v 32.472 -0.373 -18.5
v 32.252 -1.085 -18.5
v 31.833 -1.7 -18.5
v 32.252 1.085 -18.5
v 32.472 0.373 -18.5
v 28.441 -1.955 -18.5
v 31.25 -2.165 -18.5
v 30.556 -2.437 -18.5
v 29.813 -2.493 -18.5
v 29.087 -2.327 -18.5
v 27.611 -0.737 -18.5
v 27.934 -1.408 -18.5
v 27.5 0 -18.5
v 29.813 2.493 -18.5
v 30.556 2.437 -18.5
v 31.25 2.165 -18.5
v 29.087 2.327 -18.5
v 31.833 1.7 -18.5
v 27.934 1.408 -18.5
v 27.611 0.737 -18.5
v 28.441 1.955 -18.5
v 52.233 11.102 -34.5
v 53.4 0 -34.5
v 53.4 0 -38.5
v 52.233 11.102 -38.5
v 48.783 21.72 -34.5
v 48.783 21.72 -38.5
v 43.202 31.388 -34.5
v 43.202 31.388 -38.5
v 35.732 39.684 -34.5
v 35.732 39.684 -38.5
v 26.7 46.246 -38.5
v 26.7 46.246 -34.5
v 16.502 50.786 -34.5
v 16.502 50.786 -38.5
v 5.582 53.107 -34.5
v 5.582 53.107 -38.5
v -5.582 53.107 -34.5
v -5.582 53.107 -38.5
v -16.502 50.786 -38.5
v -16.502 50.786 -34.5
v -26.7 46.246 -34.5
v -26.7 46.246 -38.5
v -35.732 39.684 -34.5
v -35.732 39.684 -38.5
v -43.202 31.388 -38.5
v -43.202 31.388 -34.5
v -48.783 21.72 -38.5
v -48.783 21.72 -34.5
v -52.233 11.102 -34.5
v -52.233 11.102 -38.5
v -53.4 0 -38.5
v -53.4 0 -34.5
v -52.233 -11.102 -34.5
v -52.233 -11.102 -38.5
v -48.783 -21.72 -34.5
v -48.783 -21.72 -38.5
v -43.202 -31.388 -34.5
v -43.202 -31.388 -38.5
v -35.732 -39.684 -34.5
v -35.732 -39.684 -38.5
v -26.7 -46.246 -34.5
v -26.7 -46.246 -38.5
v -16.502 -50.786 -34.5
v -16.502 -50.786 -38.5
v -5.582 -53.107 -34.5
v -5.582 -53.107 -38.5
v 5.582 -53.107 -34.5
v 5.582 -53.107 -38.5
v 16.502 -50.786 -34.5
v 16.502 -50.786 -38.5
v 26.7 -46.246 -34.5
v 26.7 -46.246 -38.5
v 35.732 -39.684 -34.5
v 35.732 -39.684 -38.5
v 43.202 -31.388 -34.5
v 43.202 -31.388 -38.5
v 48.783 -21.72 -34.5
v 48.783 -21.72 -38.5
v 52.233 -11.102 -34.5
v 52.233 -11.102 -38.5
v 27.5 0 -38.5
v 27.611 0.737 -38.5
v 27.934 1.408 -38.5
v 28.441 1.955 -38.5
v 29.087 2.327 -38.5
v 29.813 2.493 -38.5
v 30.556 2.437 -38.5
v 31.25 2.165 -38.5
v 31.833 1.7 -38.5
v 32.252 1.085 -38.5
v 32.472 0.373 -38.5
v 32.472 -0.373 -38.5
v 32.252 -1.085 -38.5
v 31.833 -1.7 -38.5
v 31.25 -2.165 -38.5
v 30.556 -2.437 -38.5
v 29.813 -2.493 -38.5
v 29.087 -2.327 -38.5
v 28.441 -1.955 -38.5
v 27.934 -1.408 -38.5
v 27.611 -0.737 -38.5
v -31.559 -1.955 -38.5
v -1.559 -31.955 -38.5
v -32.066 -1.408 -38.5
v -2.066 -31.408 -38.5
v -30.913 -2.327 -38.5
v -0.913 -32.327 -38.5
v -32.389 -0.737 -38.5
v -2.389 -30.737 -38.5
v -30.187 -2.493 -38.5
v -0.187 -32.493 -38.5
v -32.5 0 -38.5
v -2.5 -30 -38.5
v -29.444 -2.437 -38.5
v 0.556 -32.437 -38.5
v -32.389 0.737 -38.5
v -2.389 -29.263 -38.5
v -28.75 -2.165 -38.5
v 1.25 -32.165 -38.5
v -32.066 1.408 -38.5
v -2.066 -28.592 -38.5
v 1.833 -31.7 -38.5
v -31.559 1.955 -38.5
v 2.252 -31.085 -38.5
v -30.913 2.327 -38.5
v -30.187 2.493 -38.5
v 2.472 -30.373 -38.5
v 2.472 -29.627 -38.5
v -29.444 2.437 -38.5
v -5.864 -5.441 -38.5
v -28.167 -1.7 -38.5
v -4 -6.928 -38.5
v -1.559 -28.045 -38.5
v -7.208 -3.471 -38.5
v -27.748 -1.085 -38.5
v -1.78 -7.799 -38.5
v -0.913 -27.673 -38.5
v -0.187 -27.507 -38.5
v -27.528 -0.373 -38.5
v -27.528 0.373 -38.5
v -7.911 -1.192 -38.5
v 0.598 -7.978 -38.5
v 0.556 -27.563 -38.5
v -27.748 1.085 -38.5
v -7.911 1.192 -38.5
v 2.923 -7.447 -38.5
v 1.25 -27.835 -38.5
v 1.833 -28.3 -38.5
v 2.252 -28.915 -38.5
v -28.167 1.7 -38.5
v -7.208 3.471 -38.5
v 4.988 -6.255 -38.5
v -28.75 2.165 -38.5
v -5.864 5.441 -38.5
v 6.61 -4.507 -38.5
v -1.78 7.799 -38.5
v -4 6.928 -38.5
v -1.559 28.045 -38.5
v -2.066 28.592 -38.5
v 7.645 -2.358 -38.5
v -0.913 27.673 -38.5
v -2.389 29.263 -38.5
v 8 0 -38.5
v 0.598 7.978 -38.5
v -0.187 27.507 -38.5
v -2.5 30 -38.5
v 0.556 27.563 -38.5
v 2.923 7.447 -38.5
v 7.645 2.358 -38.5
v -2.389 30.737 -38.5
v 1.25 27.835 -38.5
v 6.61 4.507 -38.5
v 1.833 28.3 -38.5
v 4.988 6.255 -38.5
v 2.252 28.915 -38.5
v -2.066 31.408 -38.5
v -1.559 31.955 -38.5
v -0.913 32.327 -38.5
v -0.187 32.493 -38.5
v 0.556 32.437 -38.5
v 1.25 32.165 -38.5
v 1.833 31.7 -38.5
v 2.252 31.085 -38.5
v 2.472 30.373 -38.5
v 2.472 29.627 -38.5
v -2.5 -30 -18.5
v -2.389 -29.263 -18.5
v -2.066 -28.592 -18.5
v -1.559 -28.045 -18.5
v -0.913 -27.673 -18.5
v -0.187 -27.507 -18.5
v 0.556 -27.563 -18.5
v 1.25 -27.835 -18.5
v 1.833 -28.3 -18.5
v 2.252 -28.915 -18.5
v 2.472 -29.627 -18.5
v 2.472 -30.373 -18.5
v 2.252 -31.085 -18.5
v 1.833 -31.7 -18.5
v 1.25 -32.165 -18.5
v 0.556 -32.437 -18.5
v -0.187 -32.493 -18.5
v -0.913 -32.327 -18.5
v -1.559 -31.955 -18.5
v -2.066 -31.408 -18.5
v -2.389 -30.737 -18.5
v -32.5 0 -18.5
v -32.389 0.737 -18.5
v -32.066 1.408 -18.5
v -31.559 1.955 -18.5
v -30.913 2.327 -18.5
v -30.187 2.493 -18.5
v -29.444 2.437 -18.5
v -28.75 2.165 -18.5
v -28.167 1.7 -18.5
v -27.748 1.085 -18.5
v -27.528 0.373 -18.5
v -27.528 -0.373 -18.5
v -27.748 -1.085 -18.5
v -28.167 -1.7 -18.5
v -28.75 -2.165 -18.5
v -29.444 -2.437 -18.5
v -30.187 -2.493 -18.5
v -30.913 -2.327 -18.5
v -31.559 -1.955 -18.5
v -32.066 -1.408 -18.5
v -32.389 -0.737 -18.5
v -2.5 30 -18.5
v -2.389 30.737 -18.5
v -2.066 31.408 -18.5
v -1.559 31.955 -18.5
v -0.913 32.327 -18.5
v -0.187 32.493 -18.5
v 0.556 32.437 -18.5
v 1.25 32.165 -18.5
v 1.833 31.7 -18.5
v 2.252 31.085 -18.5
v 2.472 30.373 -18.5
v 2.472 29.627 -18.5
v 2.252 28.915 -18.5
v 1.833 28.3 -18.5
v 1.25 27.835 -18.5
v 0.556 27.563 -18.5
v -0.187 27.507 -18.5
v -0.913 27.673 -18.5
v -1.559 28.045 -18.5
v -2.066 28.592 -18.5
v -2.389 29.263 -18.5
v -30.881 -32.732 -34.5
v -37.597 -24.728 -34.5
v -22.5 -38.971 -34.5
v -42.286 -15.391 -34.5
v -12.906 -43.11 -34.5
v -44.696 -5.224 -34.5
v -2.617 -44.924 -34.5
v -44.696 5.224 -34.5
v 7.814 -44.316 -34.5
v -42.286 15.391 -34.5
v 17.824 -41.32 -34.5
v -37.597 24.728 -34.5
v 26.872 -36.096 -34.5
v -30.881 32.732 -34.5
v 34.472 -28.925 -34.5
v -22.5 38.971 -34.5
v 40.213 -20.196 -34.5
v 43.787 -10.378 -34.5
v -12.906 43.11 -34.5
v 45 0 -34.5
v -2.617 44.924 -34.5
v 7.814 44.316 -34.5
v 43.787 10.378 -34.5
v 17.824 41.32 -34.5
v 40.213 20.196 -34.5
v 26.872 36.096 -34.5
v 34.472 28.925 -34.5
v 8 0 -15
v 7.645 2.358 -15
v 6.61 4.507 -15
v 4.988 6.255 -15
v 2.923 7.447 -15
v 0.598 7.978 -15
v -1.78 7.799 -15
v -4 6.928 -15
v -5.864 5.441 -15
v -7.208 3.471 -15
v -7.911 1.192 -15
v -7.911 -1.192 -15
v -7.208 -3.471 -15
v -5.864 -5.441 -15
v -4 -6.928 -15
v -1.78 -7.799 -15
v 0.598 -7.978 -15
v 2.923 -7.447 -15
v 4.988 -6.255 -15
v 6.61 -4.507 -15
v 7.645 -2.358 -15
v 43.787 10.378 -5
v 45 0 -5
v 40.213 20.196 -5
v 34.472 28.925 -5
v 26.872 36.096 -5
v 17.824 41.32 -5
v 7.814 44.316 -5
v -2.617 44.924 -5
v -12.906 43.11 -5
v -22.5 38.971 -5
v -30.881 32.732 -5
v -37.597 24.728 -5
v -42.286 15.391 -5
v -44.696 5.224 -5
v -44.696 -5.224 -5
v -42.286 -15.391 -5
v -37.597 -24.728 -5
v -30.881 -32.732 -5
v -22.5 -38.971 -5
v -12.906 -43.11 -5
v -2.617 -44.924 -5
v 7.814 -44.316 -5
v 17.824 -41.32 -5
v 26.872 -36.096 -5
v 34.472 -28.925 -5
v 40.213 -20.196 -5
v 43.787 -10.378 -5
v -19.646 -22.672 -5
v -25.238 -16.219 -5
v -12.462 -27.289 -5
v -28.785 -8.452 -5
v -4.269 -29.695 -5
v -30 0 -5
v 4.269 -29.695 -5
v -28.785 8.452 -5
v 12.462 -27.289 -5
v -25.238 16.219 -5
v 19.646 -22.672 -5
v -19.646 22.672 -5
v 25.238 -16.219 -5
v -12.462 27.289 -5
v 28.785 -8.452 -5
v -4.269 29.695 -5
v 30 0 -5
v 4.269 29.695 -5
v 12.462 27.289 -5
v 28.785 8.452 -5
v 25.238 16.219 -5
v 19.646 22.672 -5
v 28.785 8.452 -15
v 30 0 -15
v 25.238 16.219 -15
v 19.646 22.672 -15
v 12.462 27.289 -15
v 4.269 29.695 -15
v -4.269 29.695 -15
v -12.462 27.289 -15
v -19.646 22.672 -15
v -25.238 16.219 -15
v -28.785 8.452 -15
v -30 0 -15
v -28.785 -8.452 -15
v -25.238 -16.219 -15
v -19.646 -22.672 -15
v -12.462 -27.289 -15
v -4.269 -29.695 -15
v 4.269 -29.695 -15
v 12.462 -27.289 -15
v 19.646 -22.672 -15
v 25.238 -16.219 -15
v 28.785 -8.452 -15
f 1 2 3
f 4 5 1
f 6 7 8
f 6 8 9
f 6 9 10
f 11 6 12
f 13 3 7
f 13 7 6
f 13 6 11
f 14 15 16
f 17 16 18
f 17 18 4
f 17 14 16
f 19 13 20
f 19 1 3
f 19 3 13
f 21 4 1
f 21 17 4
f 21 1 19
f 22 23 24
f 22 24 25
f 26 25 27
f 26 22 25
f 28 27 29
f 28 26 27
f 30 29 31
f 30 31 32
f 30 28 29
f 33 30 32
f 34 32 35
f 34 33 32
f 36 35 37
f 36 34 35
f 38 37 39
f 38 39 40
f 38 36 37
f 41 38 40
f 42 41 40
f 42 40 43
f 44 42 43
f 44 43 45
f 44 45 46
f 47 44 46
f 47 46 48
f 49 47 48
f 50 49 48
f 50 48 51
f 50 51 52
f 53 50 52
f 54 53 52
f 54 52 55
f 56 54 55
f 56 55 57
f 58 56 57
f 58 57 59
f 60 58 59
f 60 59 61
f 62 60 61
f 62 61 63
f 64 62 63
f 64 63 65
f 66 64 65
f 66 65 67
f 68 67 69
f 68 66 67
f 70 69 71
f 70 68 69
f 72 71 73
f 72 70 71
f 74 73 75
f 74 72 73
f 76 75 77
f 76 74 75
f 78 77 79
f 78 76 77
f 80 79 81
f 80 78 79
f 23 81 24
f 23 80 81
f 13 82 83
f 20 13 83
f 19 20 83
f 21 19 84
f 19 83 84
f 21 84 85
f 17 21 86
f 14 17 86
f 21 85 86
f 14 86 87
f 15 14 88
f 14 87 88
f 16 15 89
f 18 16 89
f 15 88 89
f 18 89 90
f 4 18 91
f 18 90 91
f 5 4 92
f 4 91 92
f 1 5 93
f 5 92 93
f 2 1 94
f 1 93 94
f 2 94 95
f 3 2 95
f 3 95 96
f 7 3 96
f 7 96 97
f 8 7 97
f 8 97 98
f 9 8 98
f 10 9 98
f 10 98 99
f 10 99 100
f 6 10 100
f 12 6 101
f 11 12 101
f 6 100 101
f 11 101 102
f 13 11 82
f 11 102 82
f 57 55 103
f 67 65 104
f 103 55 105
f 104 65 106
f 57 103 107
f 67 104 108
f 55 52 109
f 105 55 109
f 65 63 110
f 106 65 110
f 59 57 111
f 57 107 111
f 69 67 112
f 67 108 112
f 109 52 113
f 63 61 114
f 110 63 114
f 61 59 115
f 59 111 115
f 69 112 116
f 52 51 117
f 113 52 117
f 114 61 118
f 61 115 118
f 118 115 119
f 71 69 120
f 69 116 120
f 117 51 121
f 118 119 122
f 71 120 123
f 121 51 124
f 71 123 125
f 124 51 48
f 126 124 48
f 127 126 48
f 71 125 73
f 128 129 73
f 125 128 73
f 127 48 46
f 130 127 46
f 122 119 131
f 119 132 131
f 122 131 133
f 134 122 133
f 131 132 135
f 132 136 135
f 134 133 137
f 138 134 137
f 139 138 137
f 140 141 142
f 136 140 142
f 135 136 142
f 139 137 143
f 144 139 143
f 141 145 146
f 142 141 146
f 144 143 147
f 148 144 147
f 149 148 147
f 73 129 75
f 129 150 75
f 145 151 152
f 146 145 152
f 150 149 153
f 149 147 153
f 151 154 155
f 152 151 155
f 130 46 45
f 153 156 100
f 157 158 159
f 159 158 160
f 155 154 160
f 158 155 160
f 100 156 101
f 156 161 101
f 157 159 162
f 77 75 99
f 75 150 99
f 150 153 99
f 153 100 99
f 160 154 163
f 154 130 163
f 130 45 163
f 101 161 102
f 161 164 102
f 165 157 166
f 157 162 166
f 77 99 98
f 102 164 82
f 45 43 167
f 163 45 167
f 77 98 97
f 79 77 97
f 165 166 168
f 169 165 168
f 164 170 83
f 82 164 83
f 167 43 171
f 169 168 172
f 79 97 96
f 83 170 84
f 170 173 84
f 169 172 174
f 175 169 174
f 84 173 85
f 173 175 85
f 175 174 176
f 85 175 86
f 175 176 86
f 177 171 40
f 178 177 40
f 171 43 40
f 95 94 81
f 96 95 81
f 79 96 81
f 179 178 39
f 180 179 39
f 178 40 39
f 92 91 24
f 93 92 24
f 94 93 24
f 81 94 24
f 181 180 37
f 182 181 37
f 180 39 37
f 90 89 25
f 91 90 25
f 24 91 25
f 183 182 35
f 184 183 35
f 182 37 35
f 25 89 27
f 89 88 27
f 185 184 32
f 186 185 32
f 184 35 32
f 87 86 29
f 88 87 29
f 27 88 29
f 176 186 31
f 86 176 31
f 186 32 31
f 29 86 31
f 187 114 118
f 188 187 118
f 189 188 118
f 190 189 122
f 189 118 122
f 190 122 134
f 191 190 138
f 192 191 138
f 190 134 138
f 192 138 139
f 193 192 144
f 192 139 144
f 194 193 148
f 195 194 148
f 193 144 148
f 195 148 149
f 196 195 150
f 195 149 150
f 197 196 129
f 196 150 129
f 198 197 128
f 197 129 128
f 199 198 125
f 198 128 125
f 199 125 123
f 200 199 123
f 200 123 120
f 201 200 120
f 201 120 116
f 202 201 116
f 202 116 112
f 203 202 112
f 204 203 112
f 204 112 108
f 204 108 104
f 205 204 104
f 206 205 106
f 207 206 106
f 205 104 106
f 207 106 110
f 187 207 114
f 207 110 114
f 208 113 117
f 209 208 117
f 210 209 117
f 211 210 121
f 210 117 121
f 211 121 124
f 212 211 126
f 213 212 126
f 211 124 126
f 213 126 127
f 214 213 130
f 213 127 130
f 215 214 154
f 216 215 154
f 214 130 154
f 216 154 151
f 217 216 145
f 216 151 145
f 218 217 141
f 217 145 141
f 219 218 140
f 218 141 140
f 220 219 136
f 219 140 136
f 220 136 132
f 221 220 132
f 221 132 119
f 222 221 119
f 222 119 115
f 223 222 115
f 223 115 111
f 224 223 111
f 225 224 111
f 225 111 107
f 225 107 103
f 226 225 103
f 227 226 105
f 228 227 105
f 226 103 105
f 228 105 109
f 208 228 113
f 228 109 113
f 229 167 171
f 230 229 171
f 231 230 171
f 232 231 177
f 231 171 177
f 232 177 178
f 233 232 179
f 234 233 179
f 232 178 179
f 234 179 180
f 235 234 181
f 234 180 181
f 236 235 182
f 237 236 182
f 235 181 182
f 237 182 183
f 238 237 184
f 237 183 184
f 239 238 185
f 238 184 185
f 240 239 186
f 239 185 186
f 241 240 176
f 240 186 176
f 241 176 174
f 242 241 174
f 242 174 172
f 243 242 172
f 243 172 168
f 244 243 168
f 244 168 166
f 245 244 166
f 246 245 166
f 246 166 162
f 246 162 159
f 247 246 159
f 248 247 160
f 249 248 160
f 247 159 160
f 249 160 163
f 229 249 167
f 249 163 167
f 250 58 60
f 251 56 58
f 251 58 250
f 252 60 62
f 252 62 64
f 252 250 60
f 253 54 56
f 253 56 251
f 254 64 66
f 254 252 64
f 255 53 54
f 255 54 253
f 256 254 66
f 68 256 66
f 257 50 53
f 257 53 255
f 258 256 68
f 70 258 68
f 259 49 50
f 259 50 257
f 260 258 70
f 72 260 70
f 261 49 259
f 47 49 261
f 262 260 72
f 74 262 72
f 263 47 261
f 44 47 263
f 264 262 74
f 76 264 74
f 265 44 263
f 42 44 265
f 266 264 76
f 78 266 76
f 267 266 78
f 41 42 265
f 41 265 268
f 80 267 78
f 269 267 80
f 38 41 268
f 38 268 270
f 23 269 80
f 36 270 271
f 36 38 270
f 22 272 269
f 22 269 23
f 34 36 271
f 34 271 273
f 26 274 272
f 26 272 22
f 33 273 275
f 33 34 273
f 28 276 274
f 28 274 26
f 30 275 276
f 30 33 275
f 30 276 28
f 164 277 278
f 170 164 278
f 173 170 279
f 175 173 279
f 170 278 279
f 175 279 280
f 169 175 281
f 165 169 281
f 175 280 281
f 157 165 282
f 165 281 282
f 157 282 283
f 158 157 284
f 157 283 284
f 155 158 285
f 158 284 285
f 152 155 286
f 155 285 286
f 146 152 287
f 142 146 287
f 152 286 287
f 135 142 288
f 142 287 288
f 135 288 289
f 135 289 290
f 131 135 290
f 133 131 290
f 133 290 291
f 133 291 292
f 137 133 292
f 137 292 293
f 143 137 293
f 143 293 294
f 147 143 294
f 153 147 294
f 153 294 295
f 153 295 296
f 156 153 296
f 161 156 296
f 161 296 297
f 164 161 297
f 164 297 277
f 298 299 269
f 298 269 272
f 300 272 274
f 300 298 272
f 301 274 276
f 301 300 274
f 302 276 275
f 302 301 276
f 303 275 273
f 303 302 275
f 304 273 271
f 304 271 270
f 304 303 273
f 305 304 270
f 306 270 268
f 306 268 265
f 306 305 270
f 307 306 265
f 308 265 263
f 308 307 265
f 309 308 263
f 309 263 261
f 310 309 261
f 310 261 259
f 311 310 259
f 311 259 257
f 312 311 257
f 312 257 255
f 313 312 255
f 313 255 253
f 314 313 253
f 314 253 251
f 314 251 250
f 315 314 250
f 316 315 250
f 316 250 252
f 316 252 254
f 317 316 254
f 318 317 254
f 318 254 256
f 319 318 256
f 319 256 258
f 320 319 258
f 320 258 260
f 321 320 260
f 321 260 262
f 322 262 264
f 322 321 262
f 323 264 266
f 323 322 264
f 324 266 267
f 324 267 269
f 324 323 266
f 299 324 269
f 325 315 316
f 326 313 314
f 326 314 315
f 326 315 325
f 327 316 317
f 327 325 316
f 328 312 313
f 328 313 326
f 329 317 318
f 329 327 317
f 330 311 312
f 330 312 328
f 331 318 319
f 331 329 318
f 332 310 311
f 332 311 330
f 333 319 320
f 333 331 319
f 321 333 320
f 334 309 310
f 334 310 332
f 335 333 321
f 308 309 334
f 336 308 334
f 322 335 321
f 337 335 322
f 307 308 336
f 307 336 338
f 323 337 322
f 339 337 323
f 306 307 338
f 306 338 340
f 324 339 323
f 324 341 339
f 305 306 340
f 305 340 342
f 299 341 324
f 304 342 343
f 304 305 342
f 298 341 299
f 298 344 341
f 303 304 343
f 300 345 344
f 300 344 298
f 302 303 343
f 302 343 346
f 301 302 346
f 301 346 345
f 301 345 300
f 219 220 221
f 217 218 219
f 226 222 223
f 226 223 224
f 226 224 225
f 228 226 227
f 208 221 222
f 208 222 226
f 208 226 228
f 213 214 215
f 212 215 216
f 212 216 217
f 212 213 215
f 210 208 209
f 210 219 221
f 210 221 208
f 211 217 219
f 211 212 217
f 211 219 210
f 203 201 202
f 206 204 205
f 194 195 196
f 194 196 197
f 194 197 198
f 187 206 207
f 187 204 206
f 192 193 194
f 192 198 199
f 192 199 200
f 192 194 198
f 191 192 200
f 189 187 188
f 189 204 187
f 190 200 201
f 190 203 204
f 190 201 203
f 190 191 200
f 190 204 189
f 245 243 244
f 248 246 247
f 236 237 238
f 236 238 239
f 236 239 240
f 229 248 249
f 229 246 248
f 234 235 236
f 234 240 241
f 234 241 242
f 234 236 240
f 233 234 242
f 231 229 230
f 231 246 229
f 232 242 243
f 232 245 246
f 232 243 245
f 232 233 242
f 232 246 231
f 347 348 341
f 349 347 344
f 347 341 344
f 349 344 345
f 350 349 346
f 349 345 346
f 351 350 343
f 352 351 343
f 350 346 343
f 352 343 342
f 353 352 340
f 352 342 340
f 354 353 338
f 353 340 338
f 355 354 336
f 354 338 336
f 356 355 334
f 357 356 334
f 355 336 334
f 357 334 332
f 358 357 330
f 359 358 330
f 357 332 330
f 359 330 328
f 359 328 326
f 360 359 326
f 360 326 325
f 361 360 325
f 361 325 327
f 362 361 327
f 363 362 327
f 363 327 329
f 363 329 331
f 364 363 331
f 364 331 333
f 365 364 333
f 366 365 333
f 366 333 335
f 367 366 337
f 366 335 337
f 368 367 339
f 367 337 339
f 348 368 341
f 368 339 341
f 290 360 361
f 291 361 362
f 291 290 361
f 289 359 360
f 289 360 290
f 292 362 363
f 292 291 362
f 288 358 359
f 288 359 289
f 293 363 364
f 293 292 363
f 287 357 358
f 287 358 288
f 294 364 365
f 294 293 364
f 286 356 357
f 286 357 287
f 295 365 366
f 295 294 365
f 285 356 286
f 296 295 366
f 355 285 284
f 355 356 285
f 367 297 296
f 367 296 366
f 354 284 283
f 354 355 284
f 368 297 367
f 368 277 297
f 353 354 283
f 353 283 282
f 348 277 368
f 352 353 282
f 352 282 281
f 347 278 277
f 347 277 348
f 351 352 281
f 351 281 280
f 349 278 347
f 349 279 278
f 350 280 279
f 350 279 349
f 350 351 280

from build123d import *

# Parameters (mm, degrees)
SKETCH3_R               = 53.4
BOSS_EXTRUDE1_DEPTH     = 38.5
SKETCH4_R               = 8
CUT_EXTRUDE1_DEPTH      = 85.766561804
BOSS_EXTRUDE3_START     = 2
SKETCH6_R               = 16
SKETCH6_R_2             = 8
BOSS_EXTRUDE3_DEPTH     = 2
SKETCH8_R               = 2.5
CUT_EXTRUDE4_DEPTH      = 20
SKETCH9_R               = 53.4
SKETCH9_R_2             = 45
CUT_EXTRUDE5_DEPTH      = 34.5
CUT_EXTRUDE6_DEPTH      = 2
CUT_EXTRUDE6_DEPTH_BACK = 5
SKETCH10_R              = 50
SKETCH11_R              = 30
CUT_EXTRUDE7_DEPTH      = 10


with BuildPart() as part:
    # Sketch3 → Boss-Extrude1 (new body)
    with BuildSketch(Plane.XY):
        Circle(SKETCH3_R)
    extrude(amount=-BOSS_EXTRUDE1_DEPTH)

    # Sketch4 → Cut-Extrude1 (cut, through all)
    with BuildSketch(Plane.XY):
        Circle(SKETCH4_R)
    extrude(amount=-CUT_EXTRUDE1_DEPTH, mode=Mode.SUBTRACT)

    # Sketch6 → Boss-Extrude3 (add)
    with BuildSketch(Plane.XY.offset(BOSS_EXTRUDE3_START)):
        Circle(SKETCH6_R)
        Circle(SKETCH6_R_2, mode=Mode.SUBTRACT)
    extrude(amount=-BOSS_EXTRUDE3_DEPTH)

    # Sketch8 → Cut-Extrude4 (cut)
    with BuildSketch(Plane(origin=(0, 0, -38.5), x_dir=(-1, 0, 0), z_dir=(0, 0, -1))):
        with Locations((0, 30)):
            Circle(SKETCH8_R)
        with Locations((30, 0)):
            Circle(SKETCH8_R)
        with Locations((0, -30)):
            Circle(SKETCH8_R)
        with Locations((-30, 0)):
            Circle(SKETCH8_R)
    extrude(amount=-CUT_EXTRUDE4_DEPTH, mode=Mode.SUBTRACT)

    # Sketch9 → Cut-Extrude5 (cut)
    with BuildSketch(Plane.XY):
        Circle(SKETCH9_R)
        Circle(SKETCH9_R_2, mode=Mode.SUBTRACT)
    extrude(amount=-CUT_EXTRUDE5_DEPTH, mode=Mode.SUBTRACT)

    # Sketch10 → Cut-Extrude6 (cut, two sides: drawn at the far end of the back side and taken through both)
    with BuildSketch(Plane.XY.offset(-CUT_EXTRUDE6_DEPTH_BACK)):
        Circle(SKETCH10_R)
    extrude(amount=CUT_EXTRUDE6_DEPTH + CUT_EXTRUDE6_DEPTH_BACK, mode=Mode.SUBTRACT)

    # Sketch11 → Cut-Extrude7 (cut)
    with BuildSketch(Plane.XY.offset(-5)):
        Circle(SKETCH11_R)
    extrude(amount=-CUT_EXTRUDE7_DEPTH, mode=Mode.SUBTRACT)


solid = part.part
